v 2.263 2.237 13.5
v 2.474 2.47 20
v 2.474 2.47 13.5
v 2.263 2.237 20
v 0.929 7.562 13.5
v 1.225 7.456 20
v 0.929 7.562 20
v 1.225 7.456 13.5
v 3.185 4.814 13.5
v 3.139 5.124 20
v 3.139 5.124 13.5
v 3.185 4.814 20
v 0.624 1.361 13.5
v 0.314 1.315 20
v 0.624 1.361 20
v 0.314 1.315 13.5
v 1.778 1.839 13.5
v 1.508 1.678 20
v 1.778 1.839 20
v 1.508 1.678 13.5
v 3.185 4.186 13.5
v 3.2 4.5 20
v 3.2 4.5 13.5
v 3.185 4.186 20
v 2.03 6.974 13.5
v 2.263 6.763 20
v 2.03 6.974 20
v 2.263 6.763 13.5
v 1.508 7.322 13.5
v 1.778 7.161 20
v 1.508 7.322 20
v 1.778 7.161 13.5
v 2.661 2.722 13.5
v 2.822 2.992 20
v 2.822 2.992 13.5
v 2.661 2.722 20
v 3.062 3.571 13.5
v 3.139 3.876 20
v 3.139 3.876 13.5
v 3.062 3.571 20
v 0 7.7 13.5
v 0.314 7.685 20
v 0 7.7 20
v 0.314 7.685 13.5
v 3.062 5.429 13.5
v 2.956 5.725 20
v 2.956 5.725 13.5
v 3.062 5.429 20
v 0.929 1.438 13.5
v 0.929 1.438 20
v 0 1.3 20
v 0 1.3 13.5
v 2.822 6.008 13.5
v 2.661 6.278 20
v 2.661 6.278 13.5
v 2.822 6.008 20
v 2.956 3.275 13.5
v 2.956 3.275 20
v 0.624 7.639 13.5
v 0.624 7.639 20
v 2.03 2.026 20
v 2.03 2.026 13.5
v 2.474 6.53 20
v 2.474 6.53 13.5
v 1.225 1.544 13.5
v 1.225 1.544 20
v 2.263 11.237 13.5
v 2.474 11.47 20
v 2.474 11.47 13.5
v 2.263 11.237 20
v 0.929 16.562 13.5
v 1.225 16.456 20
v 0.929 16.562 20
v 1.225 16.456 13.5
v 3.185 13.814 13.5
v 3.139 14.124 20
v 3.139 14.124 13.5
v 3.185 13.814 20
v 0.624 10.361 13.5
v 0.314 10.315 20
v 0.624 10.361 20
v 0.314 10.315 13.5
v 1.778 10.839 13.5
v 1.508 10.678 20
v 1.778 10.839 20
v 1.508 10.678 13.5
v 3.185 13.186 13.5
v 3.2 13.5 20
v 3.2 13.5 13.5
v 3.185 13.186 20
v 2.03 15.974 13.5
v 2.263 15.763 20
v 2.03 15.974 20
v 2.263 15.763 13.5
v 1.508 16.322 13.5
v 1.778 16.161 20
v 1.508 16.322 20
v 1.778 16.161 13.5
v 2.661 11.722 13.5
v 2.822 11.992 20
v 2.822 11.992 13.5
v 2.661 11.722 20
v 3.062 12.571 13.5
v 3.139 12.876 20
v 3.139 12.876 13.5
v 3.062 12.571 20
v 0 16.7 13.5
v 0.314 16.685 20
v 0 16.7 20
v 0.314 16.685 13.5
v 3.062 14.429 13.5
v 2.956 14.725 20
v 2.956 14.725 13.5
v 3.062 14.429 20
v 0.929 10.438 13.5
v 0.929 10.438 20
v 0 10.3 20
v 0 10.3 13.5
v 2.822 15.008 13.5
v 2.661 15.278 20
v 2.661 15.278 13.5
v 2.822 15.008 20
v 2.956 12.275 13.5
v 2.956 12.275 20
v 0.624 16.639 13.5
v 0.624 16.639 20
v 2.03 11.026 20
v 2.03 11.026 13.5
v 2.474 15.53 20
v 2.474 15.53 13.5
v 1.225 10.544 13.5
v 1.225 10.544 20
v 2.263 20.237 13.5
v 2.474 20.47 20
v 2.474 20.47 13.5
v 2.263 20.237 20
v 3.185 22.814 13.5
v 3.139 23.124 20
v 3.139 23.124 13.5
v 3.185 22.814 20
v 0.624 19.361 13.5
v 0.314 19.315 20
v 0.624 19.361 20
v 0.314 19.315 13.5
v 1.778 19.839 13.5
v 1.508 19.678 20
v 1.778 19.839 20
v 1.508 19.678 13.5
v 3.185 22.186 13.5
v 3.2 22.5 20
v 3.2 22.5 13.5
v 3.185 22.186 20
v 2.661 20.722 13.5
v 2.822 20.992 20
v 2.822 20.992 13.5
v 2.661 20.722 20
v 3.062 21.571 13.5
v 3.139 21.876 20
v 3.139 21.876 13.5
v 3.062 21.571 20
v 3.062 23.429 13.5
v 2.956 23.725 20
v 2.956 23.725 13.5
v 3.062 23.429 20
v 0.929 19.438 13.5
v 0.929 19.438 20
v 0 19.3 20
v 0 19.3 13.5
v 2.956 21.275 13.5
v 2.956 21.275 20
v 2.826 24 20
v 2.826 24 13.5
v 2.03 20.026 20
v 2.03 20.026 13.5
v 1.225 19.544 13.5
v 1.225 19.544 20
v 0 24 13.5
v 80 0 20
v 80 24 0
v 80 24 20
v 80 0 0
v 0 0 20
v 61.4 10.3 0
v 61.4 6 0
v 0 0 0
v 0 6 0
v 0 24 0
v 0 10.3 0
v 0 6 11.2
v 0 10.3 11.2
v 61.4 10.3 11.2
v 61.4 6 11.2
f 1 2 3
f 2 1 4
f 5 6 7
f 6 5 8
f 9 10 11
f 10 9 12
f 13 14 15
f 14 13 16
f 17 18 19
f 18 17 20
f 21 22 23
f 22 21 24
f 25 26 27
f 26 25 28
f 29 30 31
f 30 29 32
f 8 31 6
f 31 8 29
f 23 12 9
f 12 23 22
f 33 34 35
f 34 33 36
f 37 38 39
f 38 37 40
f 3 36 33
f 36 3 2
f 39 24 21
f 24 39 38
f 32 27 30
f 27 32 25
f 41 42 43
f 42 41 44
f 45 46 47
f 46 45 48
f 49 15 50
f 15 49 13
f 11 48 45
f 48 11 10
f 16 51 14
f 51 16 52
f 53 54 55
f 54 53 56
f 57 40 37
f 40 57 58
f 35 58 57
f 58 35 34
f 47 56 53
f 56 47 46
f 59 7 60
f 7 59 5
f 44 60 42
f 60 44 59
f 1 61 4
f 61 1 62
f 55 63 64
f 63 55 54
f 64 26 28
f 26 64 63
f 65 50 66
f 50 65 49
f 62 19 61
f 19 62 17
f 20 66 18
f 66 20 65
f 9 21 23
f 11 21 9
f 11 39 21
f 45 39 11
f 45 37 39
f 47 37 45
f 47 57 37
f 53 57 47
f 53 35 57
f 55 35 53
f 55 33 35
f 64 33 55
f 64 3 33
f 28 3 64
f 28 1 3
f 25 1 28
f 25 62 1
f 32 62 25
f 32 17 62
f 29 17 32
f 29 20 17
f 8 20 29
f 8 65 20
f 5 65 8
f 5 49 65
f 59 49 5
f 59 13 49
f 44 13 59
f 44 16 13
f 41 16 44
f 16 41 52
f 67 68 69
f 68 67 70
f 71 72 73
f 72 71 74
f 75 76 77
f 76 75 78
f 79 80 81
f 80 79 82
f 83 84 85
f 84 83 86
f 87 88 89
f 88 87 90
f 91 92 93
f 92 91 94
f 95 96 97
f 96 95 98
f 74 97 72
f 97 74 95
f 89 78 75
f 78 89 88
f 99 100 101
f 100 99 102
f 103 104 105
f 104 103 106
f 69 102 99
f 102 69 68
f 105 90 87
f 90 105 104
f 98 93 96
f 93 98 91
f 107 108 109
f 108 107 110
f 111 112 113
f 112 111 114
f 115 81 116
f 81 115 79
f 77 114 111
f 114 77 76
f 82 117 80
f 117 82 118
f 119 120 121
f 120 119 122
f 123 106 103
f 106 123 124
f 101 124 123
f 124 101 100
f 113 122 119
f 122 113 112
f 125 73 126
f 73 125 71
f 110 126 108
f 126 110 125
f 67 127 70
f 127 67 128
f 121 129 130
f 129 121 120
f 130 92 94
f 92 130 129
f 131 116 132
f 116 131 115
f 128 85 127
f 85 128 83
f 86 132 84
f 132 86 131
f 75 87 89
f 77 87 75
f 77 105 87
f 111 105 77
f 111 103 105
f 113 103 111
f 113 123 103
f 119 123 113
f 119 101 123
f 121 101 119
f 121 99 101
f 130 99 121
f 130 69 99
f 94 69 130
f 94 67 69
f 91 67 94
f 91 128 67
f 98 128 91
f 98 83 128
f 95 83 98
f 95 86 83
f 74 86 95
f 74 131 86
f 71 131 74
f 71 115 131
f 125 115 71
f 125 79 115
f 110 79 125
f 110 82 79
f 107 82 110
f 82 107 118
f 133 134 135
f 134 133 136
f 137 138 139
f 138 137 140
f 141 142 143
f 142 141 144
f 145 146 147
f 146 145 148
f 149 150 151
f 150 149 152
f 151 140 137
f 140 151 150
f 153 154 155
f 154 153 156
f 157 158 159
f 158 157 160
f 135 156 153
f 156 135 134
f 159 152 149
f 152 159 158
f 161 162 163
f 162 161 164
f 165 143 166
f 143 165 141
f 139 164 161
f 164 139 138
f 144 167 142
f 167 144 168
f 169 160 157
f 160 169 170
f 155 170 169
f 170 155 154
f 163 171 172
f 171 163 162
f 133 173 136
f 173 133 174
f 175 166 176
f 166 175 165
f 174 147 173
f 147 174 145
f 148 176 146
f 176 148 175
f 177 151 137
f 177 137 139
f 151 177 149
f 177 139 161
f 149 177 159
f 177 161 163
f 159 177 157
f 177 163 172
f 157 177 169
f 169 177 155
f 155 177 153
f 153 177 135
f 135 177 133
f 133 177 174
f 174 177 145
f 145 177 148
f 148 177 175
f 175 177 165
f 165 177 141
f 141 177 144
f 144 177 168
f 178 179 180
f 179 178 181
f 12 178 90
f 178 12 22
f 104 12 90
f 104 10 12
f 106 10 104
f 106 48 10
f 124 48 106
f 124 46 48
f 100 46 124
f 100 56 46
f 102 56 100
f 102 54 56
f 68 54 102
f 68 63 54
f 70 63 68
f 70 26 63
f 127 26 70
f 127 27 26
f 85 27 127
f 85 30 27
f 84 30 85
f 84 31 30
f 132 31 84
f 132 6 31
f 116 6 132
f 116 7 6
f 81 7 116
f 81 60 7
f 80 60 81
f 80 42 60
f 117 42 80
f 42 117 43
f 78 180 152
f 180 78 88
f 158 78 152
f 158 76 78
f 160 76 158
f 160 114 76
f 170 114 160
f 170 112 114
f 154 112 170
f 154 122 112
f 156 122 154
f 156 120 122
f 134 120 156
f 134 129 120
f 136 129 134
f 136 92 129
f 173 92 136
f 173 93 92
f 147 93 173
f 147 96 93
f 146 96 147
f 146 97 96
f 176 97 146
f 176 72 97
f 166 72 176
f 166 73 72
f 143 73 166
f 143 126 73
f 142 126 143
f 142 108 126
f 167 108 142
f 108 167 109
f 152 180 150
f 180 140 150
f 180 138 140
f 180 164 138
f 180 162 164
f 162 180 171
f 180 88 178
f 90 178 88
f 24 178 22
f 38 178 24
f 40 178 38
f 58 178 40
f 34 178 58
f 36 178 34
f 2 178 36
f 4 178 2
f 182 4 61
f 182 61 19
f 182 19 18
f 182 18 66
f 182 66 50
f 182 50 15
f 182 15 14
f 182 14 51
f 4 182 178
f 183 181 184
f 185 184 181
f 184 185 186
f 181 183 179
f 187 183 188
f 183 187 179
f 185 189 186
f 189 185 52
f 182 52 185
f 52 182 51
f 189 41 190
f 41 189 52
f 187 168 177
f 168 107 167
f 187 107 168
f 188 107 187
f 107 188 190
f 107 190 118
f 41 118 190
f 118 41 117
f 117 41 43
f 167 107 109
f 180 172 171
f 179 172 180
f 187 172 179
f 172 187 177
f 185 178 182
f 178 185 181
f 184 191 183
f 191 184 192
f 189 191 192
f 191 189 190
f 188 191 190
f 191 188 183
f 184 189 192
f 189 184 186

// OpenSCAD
// Magnetic Bead Rack for 8-tube strip

// --- Overall Block Dimensions ---
rack_length_X = 80;   // Total length along X axis
rack_width_Y = 24;    // Total width along Y axis
rack_height_Z = 20;   // Total height of the block

// --- Tube Seat Parameters ---
tube_seat_diameter_top = 6.4; // Top diameter of the tube seat hole
tube_seat_diameter_bottom = 3.0; // Bottom (narrowed) diameter of the tube seat
tube_seat_depth = 12;          // Depth from top face (Z=20) down to Z=8
tube_seat_floor_height = 2;    // Height of the floor at the bottom of the cone
tube_seat_spacing = 9;         // Center-to-center spacing between tube seats

// --- Magnet Pocket Parameters ---
magnet_length_X = 60.4;       // Length of bar magnet (must be slightly larger than rack length for centering)
magnet_width_Y = 3.3;         // Width of bar magnet
magnet_height_Z = 10.2;       // Height of bar magnet

// --- Global Settings ---
$fn = 64; // High resolution for curves

// Calculate offsets for centering the tube seats along Y=0
num_tubes = 8;
total_seat_span = (num_tubes - 1) * tube_seat_spacing;
center_offset_Y = -(total_seat_span / 2);

// --- Module Definitions ---

// Tube Seat: A conical hole cut from the top face down to a floor.
module tube_seat(y_pos) {
    // The seat is centered at X=0, and its center line is at Y=y_pos
    translate([0, y_pos, rack_height_Z]) // Start cutting from the top surface (Z=20)
    difference() {
        // 1. Main body of the cut: A cylinder representing the initial large hole
        cylinder(h = tube_seat_depth + 1, r = tube_seat_diameter_top / 2, center = true);

        // 2. The conical taper (cut out from the bottom)
        // Replaced 'cone' with hull/difference to avoid unknown module warning and ensure correct geometry.
        // We create a shape that tapers from r1 to r2 over height H.
        translate([0, 0, -tube_seat_depth]) // Position the cone base at Z=0 relative to the cylinder's center
        hull() {
            sphere(r = tube_seat_diameter_top / 2);
            translate([0, 0, -tube_seat_depth]) sphere(r = tube_seat_diameter_bottom / 2);
        }

        // 3. The floor (a solid block that stops the cut)
        // This is placed at Z = rack_height_Z - tube_seat_depth + tube_seat_floor_height
        translate([0, 0, -(tube_seat_depth - tube_seat_floor_height)])
        cube([tube_seat_diameter_top * 1.5, tube_seat_diameter_top * 1.5, tube_seat_floor_height]);

    }
}


// Magnet Pocket: A rectangular cutout for the magnet
module magnet_pocket(y_pos) {
    // The pocket is centered in X (X=0). It extends from Z=0 up to Z=magnet_height_Z.
    translate([0, y_pos, 0])
    cube([magnet_length_X + 1, magnet_width_Y + 1, magnet_height_Z + 1]); // Add padding for cutting clearance
}


// --- Main Assembly ---

difference() {
    // 1. The main solid block (Rack Body)
    // Centered on origin in X and Y, resting on Z=0 plane.
    translate([0, 0, 0])
    cube([rack_length_X, rack_width_Y, rack_height_Z]);

    // 2. Tube Seat Holes (Cut along Y=0 line)
    for (i = [0 : num_tubes - 1]) {
        y_pos = center_offset_Y + i * tube_seat_spacing;
        tube_seat(y_pos);
    }

    // 3. Magnet Pockets (Cutouts beside the row)
    // Pocket 1: Y = -6 mm
    magnet_pocket(-6);
    // Pocket 2: Y = +6 mm
    magnet_pocket(6);
}
